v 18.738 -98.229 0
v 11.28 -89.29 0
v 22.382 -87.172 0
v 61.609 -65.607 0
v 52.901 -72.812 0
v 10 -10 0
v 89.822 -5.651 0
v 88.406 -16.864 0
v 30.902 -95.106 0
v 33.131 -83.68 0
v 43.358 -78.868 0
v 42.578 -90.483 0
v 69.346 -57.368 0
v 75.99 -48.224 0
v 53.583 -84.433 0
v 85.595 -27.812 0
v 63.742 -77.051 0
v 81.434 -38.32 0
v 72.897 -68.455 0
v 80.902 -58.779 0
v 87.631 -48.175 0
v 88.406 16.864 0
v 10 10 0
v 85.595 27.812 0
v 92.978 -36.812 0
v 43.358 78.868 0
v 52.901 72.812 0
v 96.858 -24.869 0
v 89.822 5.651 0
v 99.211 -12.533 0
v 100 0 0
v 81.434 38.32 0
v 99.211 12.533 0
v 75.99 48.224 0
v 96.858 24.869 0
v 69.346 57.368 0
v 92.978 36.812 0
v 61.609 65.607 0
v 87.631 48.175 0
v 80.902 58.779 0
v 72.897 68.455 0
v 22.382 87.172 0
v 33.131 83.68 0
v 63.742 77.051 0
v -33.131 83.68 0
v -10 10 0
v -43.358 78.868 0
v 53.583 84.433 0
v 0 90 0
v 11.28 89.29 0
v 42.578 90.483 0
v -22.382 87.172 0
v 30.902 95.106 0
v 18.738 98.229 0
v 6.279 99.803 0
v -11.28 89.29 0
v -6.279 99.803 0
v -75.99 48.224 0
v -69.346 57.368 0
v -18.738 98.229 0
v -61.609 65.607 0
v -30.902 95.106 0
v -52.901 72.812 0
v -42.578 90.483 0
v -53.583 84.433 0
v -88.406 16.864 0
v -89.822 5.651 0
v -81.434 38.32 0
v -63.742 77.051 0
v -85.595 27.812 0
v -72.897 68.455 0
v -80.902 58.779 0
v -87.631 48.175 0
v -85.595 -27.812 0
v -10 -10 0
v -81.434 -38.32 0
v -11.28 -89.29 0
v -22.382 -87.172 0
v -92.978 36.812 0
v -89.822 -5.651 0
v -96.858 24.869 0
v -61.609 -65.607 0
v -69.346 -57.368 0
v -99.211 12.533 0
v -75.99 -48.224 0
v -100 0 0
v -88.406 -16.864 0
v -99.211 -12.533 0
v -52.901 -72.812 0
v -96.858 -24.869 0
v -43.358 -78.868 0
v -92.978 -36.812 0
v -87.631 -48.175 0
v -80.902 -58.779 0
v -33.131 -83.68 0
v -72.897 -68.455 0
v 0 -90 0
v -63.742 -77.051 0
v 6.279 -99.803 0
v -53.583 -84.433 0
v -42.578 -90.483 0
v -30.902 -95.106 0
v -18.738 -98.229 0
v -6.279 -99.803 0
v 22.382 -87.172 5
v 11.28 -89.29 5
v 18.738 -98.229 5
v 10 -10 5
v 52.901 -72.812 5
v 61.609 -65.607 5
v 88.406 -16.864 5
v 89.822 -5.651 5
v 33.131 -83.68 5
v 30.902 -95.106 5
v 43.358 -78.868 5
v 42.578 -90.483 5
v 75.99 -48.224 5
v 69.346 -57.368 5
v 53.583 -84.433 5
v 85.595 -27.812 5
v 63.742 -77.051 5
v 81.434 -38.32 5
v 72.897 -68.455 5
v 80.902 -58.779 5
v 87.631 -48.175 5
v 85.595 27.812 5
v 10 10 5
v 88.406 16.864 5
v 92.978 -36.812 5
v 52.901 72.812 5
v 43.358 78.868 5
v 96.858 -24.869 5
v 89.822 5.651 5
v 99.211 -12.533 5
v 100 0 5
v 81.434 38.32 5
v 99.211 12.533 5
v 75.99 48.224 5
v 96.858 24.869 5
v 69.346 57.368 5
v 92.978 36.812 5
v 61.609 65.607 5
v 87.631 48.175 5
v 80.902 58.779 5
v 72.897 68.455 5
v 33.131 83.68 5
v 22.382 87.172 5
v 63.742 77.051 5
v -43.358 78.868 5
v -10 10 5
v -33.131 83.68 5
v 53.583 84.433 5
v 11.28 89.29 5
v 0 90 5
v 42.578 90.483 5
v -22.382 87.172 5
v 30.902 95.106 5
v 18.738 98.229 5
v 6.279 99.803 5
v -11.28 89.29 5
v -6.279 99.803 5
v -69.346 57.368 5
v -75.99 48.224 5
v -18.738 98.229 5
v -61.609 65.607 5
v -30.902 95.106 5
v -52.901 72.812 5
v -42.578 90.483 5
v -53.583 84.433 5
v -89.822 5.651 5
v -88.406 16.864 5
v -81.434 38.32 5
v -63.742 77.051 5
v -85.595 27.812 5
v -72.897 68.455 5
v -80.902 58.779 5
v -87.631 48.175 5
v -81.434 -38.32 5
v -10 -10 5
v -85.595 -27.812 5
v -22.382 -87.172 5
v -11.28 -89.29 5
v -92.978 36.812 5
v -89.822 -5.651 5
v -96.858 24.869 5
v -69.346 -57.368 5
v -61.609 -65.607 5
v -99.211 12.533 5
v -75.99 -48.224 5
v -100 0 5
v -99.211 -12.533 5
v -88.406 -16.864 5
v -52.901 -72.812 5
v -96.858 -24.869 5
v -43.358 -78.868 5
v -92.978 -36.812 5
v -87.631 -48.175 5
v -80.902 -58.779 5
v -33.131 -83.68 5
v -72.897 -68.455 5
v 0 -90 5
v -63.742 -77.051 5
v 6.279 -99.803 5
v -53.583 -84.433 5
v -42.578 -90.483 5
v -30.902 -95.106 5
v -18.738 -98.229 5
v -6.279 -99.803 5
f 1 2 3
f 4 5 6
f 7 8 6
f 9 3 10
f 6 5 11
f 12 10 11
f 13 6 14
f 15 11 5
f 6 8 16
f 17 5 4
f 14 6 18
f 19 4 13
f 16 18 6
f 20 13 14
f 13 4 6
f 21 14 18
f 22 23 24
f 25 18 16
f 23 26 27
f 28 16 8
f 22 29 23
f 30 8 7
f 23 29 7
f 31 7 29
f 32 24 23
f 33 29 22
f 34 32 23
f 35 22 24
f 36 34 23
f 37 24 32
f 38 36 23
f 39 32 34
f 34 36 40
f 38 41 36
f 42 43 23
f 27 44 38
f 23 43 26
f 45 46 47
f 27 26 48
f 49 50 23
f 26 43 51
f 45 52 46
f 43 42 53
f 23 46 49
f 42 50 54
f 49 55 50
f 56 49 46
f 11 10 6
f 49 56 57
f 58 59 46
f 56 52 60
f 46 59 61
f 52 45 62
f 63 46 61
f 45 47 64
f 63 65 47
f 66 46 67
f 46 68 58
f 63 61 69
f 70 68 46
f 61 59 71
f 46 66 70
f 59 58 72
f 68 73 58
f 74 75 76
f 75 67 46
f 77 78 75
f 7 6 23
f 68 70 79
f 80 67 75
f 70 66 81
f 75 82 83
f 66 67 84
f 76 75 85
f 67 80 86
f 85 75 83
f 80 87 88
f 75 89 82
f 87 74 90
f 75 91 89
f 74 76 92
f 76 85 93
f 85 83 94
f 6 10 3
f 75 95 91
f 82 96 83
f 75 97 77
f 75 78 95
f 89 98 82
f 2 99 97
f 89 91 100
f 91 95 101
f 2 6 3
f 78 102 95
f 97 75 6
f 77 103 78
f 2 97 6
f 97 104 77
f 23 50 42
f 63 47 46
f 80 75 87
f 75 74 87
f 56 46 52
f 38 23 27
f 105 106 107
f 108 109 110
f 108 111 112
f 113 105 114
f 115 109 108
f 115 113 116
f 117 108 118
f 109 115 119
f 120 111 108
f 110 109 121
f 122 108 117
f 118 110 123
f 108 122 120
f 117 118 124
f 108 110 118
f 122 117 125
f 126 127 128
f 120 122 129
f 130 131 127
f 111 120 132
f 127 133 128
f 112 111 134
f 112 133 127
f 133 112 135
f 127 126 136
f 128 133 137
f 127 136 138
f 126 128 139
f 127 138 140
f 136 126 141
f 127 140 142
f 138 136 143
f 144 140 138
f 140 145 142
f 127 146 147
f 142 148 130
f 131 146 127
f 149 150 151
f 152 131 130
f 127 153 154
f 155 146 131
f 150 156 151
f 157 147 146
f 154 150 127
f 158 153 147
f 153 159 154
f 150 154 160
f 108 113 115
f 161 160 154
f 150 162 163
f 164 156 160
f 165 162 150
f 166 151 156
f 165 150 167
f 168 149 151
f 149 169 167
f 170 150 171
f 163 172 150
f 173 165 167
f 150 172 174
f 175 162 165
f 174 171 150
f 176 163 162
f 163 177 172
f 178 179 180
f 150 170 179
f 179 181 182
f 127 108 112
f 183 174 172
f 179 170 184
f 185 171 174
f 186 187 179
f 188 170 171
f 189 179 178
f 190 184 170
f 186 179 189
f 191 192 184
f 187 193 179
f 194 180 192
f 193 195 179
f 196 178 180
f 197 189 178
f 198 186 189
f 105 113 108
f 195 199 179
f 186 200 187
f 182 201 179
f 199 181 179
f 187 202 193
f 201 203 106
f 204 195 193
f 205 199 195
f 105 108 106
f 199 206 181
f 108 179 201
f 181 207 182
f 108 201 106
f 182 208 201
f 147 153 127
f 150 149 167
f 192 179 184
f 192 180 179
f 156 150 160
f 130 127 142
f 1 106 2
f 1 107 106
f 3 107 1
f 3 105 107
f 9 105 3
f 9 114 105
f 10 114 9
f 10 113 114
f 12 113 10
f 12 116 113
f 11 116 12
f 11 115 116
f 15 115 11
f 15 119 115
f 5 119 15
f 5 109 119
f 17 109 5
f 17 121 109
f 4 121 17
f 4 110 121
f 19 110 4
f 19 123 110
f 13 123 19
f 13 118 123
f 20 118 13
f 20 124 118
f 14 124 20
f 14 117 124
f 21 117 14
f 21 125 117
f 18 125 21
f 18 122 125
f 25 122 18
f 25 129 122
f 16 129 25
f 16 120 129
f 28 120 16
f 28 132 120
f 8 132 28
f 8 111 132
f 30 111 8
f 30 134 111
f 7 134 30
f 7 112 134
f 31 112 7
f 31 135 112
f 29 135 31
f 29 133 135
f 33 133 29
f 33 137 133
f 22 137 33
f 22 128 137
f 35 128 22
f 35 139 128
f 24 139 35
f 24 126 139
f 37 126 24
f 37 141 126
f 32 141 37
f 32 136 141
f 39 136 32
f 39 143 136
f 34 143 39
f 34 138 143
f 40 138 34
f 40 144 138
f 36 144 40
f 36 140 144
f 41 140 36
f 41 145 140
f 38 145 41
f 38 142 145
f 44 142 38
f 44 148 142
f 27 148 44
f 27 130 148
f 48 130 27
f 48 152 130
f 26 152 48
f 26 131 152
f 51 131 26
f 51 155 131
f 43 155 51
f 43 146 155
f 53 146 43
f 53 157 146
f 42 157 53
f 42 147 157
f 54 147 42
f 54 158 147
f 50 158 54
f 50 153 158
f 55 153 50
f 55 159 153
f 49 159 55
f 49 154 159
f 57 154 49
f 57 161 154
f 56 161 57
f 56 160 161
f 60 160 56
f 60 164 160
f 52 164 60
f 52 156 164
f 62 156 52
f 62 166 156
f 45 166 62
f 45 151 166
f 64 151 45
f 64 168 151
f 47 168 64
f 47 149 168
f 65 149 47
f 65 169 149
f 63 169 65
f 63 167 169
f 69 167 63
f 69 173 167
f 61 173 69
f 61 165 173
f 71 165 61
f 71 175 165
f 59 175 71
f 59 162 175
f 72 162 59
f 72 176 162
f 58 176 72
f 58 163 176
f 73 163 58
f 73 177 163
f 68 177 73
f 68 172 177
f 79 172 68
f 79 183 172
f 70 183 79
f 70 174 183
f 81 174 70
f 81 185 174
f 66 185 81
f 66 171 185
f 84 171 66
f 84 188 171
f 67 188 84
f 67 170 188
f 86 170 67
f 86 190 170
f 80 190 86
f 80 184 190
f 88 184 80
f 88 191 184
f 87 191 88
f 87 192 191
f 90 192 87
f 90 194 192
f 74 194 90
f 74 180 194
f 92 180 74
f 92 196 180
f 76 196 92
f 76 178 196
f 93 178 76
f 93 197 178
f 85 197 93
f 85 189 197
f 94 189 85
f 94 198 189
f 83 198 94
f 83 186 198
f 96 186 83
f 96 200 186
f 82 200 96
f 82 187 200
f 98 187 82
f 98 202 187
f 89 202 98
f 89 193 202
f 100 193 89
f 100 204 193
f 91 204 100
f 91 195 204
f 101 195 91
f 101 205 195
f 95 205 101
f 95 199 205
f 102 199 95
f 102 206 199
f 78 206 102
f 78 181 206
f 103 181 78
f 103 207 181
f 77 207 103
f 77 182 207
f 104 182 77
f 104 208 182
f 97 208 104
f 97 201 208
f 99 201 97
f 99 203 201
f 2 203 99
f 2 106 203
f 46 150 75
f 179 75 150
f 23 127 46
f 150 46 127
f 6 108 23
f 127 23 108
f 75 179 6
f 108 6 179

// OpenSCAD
/* convert polar coordinates to cartesian */
function pol2cart(r, phi) = [ r*cos(phi), r*sin(phi) ];

/* concatenate two lists in an alternating way
   Note: If the two lists have different lengths, the
     function stops at the end of the shorter list. */
function catAlternating(L1, L2) = [
    for (i = [0 : (2*min(len(L1), len(L2)) - 1)])
        (i % 2 == 0)?L1[floor(i / 2)]:L2[floor(i / 2)]
];

module triangleGear(radius, teeth, depth) {
    phiStep = 360/teeth;
    outerPoints = [ for (i = [0 : teeth-1])
        pol2cart(radius, i * phiStep) ];
    innerPoints = [ for (i = [0 : teeth-1])
        pol2cart(radius - depth, (i + 0.5) * phiStep) ];
    polygon(catAlternating(outerPoints,innerPoints));
}

linear_extrude(5) difference() {
    triangleGear(100, 50, 10);
    square([20,20], center=true);
}
